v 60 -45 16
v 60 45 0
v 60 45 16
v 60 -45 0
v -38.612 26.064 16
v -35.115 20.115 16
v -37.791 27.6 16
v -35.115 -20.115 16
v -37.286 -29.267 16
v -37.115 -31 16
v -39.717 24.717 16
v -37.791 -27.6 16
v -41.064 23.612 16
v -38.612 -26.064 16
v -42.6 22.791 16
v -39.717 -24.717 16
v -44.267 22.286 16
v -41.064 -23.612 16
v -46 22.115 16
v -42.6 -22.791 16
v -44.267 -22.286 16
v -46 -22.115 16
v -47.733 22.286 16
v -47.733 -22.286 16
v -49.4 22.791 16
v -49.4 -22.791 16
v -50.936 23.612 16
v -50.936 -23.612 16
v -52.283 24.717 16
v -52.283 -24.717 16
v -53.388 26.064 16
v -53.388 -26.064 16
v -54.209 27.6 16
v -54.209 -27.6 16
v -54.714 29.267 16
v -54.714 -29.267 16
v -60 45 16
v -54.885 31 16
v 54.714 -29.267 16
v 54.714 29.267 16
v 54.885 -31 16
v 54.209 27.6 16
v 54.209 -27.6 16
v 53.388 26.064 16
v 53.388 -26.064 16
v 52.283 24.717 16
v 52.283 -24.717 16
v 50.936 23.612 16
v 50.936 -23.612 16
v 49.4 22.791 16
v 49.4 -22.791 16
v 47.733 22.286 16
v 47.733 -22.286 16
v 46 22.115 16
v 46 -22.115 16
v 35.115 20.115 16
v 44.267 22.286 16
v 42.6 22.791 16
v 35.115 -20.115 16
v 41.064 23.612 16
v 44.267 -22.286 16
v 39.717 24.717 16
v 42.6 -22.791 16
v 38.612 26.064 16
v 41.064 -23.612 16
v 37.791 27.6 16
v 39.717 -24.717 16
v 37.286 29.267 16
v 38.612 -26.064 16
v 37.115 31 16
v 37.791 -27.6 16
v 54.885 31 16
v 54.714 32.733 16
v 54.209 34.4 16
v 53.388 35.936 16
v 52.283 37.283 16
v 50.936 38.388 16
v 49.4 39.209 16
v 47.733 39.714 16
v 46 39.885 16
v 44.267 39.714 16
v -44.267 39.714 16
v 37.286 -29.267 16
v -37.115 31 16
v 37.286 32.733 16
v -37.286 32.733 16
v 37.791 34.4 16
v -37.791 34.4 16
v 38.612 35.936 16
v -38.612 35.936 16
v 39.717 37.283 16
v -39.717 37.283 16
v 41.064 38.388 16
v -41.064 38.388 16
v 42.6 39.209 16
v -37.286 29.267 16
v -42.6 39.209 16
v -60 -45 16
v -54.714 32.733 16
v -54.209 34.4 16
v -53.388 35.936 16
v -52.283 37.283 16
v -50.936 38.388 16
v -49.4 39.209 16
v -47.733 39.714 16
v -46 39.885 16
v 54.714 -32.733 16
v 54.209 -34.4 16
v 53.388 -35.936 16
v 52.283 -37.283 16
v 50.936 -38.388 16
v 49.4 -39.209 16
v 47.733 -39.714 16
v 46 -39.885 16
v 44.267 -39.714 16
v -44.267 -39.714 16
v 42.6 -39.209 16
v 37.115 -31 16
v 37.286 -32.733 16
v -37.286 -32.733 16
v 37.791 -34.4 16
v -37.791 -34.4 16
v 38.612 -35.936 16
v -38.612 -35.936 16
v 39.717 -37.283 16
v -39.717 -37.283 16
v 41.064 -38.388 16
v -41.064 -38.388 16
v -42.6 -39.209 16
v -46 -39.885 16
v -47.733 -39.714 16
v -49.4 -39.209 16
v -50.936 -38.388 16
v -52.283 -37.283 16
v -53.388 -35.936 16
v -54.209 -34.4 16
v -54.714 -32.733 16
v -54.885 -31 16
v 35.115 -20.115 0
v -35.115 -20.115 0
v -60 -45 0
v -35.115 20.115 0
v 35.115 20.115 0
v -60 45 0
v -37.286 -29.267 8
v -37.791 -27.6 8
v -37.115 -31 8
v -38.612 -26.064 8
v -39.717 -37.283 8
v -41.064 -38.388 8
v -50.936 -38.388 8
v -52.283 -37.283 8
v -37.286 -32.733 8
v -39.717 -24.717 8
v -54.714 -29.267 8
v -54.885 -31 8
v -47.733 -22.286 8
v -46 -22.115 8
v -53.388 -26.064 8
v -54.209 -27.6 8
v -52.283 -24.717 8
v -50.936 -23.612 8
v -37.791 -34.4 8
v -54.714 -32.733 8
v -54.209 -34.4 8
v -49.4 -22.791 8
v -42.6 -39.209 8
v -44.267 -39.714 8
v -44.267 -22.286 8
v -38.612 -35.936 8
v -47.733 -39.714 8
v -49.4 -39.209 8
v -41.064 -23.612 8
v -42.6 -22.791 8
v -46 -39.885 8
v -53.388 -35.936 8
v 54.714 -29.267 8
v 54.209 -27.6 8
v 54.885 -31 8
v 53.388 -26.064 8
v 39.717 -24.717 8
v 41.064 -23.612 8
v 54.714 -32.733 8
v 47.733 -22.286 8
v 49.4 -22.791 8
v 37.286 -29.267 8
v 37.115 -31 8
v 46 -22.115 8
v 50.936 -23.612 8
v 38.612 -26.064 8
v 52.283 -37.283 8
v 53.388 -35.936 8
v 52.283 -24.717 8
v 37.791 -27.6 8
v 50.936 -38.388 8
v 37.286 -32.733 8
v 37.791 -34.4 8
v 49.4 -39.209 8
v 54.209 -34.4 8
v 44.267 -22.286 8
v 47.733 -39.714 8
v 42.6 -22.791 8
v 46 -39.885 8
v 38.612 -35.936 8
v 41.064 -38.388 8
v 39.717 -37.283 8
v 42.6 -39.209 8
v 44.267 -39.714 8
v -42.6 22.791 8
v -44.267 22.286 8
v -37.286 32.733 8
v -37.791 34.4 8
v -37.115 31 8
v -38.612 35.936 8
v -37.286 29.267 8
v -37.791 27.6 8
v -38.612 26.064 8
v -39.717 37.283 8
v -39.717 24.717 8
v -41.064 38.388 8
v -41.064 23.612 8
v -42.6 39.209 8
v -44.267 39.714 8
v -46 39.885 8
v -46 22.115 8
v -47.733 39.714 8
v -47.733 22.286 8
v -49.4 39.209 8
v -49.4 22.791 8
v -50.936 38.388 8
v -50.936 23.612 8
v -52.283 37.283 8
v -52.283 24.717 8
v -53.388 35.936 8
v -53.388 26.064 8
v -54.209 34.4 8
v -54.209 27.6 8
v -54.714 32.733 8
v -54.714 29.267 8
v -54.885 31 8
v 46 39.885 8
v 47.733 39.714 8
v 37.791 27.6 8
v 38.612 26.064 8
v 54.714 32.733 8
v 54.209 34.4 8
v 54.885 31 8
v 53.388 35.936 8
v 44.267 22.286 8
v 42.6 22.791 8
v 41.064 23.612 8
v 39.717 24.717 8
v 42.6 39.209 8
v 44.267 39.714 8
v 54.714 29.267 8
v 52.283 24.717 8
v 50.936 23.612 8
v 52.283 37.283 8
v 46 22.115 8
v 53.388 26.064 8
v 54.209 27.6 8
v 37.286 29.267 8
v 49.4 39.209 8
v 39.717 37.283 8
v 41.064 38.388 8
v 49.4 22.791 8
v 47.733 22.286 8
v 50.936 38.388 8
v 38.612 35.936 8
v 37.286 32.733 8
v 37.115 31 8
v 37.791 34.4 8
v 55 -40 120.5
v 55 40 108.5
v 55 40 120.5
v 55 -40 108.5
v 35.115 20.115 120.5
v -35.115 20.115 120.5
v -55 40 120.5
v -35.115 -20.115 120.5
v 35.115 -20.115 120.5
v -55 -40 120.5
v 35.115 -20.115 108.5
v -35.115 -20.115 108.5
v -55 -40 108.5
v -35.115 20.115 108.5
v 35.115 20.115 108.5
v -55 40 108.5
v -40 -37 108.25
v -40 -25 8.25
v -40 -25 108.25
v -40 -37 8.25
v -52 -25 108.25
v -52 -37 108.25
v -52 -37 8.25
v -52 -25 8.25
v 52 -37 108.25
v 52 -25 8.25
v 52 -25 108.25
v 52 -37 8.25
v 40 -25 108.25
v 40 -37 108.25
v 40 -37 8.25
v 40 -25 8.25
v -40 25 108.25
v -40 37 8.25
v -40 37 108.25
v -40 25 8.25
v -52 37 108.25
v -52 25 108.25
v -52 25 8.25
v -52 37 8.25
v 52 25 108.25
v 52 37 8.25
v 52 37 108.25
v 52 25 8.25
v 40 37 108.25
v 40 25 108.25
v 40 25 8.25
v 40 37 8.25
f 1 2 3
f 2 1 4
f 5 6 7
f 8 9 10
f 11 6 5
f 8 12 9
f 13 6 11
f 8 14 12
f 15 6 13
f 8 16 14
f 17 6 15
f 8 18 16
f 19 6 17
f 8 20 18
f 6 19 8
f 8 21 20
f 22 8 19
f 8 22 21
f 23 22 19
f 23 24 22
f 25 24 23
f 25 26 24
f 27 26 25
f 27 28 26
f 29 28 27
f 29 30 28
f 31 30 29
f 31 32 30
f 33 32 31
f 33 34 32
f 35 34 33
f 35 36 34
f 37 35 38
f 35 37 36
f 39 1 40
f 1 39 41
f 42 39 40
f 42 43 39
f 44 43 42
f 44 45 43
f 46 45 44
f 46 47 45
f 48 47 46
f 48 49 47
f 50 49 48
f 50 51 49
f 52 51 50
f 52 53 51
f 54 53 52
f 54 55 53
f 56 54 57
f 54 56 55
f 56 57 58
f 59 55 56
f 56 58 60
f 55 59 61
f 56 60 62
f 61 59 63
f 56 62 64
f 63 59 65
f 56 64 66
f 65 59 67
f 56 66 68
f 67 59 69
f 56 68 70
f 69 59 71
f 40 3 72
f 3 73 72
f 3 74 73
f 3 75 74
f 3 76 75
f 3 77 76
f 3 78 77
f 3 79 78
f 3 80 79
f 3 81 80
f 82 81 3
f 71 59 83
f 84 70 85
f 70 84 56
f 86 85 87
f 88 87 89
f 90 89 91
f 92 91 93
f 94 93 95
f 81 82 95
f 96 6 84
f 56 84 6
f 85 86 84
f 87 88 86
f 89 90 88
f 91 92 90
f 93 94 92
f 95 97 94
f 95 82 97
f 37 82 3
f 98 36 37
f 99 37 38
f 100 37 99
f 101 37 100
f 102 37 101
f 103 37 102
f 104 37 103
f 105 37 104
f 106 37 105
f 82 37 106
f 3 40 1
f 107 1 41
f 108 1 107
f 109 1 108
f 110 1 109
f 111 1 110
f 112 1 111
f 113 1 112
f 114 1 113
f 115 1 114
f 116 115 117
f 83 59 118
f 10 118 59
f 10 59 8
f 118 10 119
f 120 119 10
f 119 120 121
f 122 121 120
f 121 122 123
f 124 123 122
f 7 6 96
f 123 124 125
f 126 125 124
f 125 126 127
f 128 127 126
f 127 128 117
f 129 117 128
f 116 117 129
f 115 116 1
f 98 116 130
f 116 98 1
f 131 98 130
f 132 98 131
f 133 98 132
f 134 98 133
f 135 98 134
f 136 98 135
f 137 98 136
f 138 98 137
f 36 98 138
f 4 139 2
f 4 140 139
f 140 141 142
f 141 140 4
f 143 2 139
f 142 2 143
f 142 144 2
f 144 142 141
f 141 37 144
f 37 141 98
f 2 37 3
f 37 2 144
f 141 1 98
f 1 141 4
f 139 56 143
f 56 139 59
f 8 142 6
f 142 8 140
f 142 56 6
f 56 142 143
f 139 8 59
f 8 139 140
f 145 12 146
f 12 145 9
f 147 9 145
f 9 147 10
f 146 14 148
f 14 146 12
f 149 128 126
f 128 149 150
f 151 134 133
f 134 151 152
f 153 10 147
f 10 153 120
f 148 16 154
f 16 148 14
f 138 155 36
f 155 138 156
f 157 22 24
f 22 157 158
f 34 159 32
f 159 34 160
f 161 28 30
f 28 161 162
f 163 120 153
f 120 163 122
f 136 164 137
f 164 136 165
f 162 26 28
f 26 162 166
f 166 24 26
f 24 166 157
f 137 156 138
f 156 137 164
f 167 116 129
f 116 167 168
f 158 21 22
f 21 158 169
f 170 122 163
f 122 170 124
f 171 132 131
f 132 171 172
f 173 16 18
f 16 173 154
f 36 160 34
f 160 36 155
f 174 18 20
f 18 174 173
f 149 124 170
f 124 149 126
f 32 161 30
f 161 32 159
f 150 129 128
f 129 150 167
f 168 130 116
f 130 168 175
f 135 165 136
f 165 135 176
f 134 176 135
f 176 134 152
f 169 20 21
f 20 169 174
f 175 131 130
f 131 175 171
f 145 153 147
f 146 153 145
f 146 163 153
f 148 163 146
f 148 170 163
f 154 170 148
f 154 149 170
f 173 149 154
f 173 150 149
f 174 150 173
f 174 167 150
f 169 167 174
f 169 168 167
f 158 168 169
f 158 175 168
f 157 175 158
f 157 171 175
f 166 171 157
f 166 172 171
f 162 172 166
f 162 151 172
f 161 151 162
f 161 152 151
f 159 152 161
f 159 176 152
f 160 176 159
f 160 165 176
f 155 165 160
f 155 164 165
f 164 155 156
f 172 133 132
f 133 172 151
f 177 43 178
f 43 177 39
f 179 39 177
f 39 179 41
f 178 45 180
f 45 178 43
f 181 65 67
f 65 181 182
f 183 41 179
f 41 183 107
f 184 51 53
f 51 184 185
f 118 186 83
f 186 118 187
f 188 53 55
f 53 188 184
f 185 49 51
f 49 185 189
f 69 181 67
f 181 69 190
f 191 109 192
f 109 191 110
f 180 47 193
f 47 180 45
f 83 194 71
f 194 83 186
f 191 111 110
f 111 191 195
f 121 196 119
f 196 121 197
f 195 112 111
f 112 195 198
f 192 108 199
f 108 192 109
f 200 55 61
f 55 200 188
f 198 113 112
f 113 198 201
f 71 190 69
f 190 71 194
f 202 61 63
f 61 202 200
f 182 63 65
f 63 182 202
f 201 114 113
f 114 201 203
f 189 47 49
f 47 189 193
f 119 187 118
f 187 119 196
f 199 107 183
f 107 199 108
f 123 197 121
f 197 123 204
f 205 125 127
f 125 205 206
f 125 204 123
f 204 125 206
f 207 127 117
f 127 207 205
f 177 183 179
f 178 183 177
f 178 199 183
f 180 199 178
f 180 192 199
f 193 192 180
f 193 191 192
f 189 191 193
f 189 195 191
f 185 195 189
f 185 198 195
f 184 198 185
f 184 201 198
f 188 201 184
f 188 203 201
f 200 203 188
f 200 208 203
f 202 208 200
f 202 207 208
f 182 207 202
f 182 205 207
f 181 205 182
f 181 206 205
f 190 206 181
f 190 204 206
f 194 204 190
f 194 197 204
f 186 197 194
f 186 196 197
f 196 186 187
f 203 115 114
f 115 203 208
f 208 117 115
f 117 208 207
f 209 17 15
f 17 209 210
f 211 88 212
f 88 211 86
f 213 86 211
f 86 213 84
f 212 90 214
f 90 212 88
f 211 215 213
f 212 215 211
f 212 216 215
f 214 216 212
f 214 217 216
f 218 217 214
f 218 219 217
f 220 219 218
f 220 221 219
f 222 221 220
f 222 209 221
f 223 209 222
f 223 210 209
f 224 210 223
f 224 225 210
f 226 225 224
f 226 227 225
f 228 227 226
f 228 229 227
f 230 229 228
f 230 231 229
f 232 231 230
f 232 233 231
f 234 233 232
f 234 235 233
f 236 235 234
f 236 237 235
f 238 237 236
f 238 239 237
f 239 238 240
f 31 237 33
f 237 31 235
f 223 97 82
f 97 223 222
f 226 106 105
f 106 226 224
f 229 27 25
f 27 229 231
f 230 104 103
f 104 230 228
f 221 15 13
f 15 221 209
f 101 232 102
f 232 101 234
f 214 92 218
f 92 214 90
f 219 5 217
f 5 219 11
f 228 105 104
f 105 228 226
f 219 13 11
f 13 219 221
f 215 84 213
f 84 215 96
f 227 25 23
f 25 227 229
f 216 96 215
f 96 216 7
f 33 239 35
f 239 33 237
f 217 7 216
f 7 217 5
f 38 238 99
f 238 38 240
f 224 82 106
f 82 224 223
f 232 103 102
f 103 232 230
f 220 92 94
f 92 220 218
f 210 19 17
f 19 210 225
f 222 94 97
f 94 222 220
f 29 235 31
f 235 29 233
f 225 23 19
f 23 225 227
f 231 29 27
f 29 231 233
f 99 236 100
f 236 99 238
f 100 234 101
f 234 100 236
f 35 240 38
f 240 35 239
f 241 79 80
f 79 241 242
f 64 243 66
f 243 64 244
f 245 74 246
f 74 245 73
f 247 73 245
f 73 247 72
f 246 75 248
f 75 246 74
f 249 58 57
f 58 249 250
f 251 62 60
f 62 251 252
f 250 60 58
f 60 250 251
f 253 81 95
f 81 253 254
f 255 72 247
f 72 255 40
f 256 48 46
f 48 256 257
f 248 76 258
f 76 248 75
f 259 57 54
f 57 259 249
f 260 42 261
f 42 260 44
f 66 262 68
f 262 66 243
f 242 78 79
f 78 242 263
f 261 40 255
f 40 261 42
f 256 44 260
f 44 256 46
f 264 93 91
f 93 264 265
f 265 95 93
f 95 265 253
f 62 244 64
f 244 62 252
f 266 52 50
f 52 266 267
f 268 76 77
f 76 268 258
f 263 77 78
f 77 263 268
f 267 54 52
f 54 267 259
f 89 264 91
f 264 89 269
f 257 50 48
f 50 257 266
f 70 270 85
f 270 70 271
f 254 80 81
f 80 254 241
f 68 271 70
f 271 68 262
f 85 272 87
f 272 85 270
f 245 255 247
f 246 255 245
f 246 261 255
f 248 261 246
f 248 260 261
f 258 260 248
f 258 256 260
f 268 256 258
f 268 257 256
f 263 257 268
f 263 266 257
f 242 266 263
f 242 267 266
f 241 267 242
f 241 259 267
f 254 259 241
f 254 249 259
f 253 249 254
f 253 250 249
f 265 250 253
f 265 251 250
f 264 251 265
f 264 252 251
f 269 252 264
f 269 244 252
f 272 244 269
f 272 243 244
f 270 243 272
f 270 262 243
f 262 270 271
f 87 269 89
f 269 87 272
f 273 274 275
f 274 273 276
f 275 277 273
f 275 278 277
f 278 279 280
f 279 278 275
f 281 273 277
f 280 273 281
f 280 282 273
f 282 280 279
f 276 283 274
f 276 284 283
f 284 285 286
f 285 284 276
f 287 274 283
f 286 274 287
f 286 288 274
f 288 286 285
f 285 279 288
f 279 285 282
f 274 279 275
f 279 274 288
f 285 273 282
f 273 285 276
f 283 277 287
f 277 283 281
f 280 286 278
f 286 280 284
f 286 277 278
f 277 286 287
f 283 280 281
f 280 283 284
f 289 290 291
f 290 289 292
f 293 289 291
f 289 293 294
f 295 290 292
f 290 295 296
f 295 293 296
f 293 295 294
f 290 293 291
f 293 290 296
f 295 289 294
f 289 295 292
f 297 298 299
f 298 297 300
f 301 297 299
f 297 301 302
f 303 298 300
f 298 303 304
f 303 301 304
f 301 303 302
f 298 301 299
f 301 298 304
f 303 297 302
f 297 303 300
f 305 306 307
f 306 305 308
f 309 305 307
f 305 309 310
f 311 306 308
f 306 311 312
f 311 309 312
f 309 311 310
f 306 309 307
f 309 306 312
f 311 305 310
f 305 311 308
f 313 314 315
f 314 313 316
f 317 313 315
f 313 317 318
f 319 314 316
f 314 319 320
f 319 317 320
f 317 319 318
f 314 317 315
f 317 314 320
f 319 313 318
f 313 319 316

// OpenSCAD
$fn = 32;

// ------------------------------------------------------------------------
// Frame cube: base 120 x 90 mm, posts 100 mm tall
// Every part is its own module, assembly() places every instance.
// ------------------------------------------------------------------------

// --- part 1 ---
module base_frame() {
  difference() {
    translate([-60, -45, 0]) cube([120, 90, 16]);
    translate([-35.115, -20.115, -1]) cube([70.23, 40.23, 18]);
    translate([-46, -31, 8]) cylinder(h = 9, d = 17.77);
    translate([46, -31, 8]) cylinder(h = 9, d = 17.77);
    translate([-46, 31, 8]) cylinder(h = 9, d = 17.77);
    translate([46, 31, 8]) cylinder(h = 9, d = 17.77);
  }
}

// --- part 2 ---
module corner_post() {
  translate([-6, -6, 0]) cube([12, 12, 100]);
}

// --- part 3 ---
module top_frame() {
  difference() {
    translate([-55, -40, 0]) cube([110, 80, 12]);
    translate([-35.115, -20.115, -1]) cube([70.23, 40.23, 14]);
  }
}

// --- assembly ---
module assembly() {
  color([0.80, 0.24, 0.20]) translate([0, 0, 0]) rotate([0, 0, 0]) base_frame();
  color([0.20, 0.45, 0.75]) translate([-46, -31, 8.25]) rotate([0, 0, 0]) corner_post();
  color([0.25, 0.62, 0.32]) translate([46, -31, 8.25]) rotate([0, 0, 0]) corner_post();
  color([0.92, 0.70, 0.18]) translate([-46, 31, 8.25]) rotate([0, 0, 0]) corner_post();
  color([0.58, 0.35, 0.70]) translate([46, 31, 8.25]) rotate([0, 0, 0]) corner_post();
  color([0.16, 0.66, 0.66]) translate([0, 0, 108.5]) rotate([0, 0, 0]) top_frame();
}

assembly();
